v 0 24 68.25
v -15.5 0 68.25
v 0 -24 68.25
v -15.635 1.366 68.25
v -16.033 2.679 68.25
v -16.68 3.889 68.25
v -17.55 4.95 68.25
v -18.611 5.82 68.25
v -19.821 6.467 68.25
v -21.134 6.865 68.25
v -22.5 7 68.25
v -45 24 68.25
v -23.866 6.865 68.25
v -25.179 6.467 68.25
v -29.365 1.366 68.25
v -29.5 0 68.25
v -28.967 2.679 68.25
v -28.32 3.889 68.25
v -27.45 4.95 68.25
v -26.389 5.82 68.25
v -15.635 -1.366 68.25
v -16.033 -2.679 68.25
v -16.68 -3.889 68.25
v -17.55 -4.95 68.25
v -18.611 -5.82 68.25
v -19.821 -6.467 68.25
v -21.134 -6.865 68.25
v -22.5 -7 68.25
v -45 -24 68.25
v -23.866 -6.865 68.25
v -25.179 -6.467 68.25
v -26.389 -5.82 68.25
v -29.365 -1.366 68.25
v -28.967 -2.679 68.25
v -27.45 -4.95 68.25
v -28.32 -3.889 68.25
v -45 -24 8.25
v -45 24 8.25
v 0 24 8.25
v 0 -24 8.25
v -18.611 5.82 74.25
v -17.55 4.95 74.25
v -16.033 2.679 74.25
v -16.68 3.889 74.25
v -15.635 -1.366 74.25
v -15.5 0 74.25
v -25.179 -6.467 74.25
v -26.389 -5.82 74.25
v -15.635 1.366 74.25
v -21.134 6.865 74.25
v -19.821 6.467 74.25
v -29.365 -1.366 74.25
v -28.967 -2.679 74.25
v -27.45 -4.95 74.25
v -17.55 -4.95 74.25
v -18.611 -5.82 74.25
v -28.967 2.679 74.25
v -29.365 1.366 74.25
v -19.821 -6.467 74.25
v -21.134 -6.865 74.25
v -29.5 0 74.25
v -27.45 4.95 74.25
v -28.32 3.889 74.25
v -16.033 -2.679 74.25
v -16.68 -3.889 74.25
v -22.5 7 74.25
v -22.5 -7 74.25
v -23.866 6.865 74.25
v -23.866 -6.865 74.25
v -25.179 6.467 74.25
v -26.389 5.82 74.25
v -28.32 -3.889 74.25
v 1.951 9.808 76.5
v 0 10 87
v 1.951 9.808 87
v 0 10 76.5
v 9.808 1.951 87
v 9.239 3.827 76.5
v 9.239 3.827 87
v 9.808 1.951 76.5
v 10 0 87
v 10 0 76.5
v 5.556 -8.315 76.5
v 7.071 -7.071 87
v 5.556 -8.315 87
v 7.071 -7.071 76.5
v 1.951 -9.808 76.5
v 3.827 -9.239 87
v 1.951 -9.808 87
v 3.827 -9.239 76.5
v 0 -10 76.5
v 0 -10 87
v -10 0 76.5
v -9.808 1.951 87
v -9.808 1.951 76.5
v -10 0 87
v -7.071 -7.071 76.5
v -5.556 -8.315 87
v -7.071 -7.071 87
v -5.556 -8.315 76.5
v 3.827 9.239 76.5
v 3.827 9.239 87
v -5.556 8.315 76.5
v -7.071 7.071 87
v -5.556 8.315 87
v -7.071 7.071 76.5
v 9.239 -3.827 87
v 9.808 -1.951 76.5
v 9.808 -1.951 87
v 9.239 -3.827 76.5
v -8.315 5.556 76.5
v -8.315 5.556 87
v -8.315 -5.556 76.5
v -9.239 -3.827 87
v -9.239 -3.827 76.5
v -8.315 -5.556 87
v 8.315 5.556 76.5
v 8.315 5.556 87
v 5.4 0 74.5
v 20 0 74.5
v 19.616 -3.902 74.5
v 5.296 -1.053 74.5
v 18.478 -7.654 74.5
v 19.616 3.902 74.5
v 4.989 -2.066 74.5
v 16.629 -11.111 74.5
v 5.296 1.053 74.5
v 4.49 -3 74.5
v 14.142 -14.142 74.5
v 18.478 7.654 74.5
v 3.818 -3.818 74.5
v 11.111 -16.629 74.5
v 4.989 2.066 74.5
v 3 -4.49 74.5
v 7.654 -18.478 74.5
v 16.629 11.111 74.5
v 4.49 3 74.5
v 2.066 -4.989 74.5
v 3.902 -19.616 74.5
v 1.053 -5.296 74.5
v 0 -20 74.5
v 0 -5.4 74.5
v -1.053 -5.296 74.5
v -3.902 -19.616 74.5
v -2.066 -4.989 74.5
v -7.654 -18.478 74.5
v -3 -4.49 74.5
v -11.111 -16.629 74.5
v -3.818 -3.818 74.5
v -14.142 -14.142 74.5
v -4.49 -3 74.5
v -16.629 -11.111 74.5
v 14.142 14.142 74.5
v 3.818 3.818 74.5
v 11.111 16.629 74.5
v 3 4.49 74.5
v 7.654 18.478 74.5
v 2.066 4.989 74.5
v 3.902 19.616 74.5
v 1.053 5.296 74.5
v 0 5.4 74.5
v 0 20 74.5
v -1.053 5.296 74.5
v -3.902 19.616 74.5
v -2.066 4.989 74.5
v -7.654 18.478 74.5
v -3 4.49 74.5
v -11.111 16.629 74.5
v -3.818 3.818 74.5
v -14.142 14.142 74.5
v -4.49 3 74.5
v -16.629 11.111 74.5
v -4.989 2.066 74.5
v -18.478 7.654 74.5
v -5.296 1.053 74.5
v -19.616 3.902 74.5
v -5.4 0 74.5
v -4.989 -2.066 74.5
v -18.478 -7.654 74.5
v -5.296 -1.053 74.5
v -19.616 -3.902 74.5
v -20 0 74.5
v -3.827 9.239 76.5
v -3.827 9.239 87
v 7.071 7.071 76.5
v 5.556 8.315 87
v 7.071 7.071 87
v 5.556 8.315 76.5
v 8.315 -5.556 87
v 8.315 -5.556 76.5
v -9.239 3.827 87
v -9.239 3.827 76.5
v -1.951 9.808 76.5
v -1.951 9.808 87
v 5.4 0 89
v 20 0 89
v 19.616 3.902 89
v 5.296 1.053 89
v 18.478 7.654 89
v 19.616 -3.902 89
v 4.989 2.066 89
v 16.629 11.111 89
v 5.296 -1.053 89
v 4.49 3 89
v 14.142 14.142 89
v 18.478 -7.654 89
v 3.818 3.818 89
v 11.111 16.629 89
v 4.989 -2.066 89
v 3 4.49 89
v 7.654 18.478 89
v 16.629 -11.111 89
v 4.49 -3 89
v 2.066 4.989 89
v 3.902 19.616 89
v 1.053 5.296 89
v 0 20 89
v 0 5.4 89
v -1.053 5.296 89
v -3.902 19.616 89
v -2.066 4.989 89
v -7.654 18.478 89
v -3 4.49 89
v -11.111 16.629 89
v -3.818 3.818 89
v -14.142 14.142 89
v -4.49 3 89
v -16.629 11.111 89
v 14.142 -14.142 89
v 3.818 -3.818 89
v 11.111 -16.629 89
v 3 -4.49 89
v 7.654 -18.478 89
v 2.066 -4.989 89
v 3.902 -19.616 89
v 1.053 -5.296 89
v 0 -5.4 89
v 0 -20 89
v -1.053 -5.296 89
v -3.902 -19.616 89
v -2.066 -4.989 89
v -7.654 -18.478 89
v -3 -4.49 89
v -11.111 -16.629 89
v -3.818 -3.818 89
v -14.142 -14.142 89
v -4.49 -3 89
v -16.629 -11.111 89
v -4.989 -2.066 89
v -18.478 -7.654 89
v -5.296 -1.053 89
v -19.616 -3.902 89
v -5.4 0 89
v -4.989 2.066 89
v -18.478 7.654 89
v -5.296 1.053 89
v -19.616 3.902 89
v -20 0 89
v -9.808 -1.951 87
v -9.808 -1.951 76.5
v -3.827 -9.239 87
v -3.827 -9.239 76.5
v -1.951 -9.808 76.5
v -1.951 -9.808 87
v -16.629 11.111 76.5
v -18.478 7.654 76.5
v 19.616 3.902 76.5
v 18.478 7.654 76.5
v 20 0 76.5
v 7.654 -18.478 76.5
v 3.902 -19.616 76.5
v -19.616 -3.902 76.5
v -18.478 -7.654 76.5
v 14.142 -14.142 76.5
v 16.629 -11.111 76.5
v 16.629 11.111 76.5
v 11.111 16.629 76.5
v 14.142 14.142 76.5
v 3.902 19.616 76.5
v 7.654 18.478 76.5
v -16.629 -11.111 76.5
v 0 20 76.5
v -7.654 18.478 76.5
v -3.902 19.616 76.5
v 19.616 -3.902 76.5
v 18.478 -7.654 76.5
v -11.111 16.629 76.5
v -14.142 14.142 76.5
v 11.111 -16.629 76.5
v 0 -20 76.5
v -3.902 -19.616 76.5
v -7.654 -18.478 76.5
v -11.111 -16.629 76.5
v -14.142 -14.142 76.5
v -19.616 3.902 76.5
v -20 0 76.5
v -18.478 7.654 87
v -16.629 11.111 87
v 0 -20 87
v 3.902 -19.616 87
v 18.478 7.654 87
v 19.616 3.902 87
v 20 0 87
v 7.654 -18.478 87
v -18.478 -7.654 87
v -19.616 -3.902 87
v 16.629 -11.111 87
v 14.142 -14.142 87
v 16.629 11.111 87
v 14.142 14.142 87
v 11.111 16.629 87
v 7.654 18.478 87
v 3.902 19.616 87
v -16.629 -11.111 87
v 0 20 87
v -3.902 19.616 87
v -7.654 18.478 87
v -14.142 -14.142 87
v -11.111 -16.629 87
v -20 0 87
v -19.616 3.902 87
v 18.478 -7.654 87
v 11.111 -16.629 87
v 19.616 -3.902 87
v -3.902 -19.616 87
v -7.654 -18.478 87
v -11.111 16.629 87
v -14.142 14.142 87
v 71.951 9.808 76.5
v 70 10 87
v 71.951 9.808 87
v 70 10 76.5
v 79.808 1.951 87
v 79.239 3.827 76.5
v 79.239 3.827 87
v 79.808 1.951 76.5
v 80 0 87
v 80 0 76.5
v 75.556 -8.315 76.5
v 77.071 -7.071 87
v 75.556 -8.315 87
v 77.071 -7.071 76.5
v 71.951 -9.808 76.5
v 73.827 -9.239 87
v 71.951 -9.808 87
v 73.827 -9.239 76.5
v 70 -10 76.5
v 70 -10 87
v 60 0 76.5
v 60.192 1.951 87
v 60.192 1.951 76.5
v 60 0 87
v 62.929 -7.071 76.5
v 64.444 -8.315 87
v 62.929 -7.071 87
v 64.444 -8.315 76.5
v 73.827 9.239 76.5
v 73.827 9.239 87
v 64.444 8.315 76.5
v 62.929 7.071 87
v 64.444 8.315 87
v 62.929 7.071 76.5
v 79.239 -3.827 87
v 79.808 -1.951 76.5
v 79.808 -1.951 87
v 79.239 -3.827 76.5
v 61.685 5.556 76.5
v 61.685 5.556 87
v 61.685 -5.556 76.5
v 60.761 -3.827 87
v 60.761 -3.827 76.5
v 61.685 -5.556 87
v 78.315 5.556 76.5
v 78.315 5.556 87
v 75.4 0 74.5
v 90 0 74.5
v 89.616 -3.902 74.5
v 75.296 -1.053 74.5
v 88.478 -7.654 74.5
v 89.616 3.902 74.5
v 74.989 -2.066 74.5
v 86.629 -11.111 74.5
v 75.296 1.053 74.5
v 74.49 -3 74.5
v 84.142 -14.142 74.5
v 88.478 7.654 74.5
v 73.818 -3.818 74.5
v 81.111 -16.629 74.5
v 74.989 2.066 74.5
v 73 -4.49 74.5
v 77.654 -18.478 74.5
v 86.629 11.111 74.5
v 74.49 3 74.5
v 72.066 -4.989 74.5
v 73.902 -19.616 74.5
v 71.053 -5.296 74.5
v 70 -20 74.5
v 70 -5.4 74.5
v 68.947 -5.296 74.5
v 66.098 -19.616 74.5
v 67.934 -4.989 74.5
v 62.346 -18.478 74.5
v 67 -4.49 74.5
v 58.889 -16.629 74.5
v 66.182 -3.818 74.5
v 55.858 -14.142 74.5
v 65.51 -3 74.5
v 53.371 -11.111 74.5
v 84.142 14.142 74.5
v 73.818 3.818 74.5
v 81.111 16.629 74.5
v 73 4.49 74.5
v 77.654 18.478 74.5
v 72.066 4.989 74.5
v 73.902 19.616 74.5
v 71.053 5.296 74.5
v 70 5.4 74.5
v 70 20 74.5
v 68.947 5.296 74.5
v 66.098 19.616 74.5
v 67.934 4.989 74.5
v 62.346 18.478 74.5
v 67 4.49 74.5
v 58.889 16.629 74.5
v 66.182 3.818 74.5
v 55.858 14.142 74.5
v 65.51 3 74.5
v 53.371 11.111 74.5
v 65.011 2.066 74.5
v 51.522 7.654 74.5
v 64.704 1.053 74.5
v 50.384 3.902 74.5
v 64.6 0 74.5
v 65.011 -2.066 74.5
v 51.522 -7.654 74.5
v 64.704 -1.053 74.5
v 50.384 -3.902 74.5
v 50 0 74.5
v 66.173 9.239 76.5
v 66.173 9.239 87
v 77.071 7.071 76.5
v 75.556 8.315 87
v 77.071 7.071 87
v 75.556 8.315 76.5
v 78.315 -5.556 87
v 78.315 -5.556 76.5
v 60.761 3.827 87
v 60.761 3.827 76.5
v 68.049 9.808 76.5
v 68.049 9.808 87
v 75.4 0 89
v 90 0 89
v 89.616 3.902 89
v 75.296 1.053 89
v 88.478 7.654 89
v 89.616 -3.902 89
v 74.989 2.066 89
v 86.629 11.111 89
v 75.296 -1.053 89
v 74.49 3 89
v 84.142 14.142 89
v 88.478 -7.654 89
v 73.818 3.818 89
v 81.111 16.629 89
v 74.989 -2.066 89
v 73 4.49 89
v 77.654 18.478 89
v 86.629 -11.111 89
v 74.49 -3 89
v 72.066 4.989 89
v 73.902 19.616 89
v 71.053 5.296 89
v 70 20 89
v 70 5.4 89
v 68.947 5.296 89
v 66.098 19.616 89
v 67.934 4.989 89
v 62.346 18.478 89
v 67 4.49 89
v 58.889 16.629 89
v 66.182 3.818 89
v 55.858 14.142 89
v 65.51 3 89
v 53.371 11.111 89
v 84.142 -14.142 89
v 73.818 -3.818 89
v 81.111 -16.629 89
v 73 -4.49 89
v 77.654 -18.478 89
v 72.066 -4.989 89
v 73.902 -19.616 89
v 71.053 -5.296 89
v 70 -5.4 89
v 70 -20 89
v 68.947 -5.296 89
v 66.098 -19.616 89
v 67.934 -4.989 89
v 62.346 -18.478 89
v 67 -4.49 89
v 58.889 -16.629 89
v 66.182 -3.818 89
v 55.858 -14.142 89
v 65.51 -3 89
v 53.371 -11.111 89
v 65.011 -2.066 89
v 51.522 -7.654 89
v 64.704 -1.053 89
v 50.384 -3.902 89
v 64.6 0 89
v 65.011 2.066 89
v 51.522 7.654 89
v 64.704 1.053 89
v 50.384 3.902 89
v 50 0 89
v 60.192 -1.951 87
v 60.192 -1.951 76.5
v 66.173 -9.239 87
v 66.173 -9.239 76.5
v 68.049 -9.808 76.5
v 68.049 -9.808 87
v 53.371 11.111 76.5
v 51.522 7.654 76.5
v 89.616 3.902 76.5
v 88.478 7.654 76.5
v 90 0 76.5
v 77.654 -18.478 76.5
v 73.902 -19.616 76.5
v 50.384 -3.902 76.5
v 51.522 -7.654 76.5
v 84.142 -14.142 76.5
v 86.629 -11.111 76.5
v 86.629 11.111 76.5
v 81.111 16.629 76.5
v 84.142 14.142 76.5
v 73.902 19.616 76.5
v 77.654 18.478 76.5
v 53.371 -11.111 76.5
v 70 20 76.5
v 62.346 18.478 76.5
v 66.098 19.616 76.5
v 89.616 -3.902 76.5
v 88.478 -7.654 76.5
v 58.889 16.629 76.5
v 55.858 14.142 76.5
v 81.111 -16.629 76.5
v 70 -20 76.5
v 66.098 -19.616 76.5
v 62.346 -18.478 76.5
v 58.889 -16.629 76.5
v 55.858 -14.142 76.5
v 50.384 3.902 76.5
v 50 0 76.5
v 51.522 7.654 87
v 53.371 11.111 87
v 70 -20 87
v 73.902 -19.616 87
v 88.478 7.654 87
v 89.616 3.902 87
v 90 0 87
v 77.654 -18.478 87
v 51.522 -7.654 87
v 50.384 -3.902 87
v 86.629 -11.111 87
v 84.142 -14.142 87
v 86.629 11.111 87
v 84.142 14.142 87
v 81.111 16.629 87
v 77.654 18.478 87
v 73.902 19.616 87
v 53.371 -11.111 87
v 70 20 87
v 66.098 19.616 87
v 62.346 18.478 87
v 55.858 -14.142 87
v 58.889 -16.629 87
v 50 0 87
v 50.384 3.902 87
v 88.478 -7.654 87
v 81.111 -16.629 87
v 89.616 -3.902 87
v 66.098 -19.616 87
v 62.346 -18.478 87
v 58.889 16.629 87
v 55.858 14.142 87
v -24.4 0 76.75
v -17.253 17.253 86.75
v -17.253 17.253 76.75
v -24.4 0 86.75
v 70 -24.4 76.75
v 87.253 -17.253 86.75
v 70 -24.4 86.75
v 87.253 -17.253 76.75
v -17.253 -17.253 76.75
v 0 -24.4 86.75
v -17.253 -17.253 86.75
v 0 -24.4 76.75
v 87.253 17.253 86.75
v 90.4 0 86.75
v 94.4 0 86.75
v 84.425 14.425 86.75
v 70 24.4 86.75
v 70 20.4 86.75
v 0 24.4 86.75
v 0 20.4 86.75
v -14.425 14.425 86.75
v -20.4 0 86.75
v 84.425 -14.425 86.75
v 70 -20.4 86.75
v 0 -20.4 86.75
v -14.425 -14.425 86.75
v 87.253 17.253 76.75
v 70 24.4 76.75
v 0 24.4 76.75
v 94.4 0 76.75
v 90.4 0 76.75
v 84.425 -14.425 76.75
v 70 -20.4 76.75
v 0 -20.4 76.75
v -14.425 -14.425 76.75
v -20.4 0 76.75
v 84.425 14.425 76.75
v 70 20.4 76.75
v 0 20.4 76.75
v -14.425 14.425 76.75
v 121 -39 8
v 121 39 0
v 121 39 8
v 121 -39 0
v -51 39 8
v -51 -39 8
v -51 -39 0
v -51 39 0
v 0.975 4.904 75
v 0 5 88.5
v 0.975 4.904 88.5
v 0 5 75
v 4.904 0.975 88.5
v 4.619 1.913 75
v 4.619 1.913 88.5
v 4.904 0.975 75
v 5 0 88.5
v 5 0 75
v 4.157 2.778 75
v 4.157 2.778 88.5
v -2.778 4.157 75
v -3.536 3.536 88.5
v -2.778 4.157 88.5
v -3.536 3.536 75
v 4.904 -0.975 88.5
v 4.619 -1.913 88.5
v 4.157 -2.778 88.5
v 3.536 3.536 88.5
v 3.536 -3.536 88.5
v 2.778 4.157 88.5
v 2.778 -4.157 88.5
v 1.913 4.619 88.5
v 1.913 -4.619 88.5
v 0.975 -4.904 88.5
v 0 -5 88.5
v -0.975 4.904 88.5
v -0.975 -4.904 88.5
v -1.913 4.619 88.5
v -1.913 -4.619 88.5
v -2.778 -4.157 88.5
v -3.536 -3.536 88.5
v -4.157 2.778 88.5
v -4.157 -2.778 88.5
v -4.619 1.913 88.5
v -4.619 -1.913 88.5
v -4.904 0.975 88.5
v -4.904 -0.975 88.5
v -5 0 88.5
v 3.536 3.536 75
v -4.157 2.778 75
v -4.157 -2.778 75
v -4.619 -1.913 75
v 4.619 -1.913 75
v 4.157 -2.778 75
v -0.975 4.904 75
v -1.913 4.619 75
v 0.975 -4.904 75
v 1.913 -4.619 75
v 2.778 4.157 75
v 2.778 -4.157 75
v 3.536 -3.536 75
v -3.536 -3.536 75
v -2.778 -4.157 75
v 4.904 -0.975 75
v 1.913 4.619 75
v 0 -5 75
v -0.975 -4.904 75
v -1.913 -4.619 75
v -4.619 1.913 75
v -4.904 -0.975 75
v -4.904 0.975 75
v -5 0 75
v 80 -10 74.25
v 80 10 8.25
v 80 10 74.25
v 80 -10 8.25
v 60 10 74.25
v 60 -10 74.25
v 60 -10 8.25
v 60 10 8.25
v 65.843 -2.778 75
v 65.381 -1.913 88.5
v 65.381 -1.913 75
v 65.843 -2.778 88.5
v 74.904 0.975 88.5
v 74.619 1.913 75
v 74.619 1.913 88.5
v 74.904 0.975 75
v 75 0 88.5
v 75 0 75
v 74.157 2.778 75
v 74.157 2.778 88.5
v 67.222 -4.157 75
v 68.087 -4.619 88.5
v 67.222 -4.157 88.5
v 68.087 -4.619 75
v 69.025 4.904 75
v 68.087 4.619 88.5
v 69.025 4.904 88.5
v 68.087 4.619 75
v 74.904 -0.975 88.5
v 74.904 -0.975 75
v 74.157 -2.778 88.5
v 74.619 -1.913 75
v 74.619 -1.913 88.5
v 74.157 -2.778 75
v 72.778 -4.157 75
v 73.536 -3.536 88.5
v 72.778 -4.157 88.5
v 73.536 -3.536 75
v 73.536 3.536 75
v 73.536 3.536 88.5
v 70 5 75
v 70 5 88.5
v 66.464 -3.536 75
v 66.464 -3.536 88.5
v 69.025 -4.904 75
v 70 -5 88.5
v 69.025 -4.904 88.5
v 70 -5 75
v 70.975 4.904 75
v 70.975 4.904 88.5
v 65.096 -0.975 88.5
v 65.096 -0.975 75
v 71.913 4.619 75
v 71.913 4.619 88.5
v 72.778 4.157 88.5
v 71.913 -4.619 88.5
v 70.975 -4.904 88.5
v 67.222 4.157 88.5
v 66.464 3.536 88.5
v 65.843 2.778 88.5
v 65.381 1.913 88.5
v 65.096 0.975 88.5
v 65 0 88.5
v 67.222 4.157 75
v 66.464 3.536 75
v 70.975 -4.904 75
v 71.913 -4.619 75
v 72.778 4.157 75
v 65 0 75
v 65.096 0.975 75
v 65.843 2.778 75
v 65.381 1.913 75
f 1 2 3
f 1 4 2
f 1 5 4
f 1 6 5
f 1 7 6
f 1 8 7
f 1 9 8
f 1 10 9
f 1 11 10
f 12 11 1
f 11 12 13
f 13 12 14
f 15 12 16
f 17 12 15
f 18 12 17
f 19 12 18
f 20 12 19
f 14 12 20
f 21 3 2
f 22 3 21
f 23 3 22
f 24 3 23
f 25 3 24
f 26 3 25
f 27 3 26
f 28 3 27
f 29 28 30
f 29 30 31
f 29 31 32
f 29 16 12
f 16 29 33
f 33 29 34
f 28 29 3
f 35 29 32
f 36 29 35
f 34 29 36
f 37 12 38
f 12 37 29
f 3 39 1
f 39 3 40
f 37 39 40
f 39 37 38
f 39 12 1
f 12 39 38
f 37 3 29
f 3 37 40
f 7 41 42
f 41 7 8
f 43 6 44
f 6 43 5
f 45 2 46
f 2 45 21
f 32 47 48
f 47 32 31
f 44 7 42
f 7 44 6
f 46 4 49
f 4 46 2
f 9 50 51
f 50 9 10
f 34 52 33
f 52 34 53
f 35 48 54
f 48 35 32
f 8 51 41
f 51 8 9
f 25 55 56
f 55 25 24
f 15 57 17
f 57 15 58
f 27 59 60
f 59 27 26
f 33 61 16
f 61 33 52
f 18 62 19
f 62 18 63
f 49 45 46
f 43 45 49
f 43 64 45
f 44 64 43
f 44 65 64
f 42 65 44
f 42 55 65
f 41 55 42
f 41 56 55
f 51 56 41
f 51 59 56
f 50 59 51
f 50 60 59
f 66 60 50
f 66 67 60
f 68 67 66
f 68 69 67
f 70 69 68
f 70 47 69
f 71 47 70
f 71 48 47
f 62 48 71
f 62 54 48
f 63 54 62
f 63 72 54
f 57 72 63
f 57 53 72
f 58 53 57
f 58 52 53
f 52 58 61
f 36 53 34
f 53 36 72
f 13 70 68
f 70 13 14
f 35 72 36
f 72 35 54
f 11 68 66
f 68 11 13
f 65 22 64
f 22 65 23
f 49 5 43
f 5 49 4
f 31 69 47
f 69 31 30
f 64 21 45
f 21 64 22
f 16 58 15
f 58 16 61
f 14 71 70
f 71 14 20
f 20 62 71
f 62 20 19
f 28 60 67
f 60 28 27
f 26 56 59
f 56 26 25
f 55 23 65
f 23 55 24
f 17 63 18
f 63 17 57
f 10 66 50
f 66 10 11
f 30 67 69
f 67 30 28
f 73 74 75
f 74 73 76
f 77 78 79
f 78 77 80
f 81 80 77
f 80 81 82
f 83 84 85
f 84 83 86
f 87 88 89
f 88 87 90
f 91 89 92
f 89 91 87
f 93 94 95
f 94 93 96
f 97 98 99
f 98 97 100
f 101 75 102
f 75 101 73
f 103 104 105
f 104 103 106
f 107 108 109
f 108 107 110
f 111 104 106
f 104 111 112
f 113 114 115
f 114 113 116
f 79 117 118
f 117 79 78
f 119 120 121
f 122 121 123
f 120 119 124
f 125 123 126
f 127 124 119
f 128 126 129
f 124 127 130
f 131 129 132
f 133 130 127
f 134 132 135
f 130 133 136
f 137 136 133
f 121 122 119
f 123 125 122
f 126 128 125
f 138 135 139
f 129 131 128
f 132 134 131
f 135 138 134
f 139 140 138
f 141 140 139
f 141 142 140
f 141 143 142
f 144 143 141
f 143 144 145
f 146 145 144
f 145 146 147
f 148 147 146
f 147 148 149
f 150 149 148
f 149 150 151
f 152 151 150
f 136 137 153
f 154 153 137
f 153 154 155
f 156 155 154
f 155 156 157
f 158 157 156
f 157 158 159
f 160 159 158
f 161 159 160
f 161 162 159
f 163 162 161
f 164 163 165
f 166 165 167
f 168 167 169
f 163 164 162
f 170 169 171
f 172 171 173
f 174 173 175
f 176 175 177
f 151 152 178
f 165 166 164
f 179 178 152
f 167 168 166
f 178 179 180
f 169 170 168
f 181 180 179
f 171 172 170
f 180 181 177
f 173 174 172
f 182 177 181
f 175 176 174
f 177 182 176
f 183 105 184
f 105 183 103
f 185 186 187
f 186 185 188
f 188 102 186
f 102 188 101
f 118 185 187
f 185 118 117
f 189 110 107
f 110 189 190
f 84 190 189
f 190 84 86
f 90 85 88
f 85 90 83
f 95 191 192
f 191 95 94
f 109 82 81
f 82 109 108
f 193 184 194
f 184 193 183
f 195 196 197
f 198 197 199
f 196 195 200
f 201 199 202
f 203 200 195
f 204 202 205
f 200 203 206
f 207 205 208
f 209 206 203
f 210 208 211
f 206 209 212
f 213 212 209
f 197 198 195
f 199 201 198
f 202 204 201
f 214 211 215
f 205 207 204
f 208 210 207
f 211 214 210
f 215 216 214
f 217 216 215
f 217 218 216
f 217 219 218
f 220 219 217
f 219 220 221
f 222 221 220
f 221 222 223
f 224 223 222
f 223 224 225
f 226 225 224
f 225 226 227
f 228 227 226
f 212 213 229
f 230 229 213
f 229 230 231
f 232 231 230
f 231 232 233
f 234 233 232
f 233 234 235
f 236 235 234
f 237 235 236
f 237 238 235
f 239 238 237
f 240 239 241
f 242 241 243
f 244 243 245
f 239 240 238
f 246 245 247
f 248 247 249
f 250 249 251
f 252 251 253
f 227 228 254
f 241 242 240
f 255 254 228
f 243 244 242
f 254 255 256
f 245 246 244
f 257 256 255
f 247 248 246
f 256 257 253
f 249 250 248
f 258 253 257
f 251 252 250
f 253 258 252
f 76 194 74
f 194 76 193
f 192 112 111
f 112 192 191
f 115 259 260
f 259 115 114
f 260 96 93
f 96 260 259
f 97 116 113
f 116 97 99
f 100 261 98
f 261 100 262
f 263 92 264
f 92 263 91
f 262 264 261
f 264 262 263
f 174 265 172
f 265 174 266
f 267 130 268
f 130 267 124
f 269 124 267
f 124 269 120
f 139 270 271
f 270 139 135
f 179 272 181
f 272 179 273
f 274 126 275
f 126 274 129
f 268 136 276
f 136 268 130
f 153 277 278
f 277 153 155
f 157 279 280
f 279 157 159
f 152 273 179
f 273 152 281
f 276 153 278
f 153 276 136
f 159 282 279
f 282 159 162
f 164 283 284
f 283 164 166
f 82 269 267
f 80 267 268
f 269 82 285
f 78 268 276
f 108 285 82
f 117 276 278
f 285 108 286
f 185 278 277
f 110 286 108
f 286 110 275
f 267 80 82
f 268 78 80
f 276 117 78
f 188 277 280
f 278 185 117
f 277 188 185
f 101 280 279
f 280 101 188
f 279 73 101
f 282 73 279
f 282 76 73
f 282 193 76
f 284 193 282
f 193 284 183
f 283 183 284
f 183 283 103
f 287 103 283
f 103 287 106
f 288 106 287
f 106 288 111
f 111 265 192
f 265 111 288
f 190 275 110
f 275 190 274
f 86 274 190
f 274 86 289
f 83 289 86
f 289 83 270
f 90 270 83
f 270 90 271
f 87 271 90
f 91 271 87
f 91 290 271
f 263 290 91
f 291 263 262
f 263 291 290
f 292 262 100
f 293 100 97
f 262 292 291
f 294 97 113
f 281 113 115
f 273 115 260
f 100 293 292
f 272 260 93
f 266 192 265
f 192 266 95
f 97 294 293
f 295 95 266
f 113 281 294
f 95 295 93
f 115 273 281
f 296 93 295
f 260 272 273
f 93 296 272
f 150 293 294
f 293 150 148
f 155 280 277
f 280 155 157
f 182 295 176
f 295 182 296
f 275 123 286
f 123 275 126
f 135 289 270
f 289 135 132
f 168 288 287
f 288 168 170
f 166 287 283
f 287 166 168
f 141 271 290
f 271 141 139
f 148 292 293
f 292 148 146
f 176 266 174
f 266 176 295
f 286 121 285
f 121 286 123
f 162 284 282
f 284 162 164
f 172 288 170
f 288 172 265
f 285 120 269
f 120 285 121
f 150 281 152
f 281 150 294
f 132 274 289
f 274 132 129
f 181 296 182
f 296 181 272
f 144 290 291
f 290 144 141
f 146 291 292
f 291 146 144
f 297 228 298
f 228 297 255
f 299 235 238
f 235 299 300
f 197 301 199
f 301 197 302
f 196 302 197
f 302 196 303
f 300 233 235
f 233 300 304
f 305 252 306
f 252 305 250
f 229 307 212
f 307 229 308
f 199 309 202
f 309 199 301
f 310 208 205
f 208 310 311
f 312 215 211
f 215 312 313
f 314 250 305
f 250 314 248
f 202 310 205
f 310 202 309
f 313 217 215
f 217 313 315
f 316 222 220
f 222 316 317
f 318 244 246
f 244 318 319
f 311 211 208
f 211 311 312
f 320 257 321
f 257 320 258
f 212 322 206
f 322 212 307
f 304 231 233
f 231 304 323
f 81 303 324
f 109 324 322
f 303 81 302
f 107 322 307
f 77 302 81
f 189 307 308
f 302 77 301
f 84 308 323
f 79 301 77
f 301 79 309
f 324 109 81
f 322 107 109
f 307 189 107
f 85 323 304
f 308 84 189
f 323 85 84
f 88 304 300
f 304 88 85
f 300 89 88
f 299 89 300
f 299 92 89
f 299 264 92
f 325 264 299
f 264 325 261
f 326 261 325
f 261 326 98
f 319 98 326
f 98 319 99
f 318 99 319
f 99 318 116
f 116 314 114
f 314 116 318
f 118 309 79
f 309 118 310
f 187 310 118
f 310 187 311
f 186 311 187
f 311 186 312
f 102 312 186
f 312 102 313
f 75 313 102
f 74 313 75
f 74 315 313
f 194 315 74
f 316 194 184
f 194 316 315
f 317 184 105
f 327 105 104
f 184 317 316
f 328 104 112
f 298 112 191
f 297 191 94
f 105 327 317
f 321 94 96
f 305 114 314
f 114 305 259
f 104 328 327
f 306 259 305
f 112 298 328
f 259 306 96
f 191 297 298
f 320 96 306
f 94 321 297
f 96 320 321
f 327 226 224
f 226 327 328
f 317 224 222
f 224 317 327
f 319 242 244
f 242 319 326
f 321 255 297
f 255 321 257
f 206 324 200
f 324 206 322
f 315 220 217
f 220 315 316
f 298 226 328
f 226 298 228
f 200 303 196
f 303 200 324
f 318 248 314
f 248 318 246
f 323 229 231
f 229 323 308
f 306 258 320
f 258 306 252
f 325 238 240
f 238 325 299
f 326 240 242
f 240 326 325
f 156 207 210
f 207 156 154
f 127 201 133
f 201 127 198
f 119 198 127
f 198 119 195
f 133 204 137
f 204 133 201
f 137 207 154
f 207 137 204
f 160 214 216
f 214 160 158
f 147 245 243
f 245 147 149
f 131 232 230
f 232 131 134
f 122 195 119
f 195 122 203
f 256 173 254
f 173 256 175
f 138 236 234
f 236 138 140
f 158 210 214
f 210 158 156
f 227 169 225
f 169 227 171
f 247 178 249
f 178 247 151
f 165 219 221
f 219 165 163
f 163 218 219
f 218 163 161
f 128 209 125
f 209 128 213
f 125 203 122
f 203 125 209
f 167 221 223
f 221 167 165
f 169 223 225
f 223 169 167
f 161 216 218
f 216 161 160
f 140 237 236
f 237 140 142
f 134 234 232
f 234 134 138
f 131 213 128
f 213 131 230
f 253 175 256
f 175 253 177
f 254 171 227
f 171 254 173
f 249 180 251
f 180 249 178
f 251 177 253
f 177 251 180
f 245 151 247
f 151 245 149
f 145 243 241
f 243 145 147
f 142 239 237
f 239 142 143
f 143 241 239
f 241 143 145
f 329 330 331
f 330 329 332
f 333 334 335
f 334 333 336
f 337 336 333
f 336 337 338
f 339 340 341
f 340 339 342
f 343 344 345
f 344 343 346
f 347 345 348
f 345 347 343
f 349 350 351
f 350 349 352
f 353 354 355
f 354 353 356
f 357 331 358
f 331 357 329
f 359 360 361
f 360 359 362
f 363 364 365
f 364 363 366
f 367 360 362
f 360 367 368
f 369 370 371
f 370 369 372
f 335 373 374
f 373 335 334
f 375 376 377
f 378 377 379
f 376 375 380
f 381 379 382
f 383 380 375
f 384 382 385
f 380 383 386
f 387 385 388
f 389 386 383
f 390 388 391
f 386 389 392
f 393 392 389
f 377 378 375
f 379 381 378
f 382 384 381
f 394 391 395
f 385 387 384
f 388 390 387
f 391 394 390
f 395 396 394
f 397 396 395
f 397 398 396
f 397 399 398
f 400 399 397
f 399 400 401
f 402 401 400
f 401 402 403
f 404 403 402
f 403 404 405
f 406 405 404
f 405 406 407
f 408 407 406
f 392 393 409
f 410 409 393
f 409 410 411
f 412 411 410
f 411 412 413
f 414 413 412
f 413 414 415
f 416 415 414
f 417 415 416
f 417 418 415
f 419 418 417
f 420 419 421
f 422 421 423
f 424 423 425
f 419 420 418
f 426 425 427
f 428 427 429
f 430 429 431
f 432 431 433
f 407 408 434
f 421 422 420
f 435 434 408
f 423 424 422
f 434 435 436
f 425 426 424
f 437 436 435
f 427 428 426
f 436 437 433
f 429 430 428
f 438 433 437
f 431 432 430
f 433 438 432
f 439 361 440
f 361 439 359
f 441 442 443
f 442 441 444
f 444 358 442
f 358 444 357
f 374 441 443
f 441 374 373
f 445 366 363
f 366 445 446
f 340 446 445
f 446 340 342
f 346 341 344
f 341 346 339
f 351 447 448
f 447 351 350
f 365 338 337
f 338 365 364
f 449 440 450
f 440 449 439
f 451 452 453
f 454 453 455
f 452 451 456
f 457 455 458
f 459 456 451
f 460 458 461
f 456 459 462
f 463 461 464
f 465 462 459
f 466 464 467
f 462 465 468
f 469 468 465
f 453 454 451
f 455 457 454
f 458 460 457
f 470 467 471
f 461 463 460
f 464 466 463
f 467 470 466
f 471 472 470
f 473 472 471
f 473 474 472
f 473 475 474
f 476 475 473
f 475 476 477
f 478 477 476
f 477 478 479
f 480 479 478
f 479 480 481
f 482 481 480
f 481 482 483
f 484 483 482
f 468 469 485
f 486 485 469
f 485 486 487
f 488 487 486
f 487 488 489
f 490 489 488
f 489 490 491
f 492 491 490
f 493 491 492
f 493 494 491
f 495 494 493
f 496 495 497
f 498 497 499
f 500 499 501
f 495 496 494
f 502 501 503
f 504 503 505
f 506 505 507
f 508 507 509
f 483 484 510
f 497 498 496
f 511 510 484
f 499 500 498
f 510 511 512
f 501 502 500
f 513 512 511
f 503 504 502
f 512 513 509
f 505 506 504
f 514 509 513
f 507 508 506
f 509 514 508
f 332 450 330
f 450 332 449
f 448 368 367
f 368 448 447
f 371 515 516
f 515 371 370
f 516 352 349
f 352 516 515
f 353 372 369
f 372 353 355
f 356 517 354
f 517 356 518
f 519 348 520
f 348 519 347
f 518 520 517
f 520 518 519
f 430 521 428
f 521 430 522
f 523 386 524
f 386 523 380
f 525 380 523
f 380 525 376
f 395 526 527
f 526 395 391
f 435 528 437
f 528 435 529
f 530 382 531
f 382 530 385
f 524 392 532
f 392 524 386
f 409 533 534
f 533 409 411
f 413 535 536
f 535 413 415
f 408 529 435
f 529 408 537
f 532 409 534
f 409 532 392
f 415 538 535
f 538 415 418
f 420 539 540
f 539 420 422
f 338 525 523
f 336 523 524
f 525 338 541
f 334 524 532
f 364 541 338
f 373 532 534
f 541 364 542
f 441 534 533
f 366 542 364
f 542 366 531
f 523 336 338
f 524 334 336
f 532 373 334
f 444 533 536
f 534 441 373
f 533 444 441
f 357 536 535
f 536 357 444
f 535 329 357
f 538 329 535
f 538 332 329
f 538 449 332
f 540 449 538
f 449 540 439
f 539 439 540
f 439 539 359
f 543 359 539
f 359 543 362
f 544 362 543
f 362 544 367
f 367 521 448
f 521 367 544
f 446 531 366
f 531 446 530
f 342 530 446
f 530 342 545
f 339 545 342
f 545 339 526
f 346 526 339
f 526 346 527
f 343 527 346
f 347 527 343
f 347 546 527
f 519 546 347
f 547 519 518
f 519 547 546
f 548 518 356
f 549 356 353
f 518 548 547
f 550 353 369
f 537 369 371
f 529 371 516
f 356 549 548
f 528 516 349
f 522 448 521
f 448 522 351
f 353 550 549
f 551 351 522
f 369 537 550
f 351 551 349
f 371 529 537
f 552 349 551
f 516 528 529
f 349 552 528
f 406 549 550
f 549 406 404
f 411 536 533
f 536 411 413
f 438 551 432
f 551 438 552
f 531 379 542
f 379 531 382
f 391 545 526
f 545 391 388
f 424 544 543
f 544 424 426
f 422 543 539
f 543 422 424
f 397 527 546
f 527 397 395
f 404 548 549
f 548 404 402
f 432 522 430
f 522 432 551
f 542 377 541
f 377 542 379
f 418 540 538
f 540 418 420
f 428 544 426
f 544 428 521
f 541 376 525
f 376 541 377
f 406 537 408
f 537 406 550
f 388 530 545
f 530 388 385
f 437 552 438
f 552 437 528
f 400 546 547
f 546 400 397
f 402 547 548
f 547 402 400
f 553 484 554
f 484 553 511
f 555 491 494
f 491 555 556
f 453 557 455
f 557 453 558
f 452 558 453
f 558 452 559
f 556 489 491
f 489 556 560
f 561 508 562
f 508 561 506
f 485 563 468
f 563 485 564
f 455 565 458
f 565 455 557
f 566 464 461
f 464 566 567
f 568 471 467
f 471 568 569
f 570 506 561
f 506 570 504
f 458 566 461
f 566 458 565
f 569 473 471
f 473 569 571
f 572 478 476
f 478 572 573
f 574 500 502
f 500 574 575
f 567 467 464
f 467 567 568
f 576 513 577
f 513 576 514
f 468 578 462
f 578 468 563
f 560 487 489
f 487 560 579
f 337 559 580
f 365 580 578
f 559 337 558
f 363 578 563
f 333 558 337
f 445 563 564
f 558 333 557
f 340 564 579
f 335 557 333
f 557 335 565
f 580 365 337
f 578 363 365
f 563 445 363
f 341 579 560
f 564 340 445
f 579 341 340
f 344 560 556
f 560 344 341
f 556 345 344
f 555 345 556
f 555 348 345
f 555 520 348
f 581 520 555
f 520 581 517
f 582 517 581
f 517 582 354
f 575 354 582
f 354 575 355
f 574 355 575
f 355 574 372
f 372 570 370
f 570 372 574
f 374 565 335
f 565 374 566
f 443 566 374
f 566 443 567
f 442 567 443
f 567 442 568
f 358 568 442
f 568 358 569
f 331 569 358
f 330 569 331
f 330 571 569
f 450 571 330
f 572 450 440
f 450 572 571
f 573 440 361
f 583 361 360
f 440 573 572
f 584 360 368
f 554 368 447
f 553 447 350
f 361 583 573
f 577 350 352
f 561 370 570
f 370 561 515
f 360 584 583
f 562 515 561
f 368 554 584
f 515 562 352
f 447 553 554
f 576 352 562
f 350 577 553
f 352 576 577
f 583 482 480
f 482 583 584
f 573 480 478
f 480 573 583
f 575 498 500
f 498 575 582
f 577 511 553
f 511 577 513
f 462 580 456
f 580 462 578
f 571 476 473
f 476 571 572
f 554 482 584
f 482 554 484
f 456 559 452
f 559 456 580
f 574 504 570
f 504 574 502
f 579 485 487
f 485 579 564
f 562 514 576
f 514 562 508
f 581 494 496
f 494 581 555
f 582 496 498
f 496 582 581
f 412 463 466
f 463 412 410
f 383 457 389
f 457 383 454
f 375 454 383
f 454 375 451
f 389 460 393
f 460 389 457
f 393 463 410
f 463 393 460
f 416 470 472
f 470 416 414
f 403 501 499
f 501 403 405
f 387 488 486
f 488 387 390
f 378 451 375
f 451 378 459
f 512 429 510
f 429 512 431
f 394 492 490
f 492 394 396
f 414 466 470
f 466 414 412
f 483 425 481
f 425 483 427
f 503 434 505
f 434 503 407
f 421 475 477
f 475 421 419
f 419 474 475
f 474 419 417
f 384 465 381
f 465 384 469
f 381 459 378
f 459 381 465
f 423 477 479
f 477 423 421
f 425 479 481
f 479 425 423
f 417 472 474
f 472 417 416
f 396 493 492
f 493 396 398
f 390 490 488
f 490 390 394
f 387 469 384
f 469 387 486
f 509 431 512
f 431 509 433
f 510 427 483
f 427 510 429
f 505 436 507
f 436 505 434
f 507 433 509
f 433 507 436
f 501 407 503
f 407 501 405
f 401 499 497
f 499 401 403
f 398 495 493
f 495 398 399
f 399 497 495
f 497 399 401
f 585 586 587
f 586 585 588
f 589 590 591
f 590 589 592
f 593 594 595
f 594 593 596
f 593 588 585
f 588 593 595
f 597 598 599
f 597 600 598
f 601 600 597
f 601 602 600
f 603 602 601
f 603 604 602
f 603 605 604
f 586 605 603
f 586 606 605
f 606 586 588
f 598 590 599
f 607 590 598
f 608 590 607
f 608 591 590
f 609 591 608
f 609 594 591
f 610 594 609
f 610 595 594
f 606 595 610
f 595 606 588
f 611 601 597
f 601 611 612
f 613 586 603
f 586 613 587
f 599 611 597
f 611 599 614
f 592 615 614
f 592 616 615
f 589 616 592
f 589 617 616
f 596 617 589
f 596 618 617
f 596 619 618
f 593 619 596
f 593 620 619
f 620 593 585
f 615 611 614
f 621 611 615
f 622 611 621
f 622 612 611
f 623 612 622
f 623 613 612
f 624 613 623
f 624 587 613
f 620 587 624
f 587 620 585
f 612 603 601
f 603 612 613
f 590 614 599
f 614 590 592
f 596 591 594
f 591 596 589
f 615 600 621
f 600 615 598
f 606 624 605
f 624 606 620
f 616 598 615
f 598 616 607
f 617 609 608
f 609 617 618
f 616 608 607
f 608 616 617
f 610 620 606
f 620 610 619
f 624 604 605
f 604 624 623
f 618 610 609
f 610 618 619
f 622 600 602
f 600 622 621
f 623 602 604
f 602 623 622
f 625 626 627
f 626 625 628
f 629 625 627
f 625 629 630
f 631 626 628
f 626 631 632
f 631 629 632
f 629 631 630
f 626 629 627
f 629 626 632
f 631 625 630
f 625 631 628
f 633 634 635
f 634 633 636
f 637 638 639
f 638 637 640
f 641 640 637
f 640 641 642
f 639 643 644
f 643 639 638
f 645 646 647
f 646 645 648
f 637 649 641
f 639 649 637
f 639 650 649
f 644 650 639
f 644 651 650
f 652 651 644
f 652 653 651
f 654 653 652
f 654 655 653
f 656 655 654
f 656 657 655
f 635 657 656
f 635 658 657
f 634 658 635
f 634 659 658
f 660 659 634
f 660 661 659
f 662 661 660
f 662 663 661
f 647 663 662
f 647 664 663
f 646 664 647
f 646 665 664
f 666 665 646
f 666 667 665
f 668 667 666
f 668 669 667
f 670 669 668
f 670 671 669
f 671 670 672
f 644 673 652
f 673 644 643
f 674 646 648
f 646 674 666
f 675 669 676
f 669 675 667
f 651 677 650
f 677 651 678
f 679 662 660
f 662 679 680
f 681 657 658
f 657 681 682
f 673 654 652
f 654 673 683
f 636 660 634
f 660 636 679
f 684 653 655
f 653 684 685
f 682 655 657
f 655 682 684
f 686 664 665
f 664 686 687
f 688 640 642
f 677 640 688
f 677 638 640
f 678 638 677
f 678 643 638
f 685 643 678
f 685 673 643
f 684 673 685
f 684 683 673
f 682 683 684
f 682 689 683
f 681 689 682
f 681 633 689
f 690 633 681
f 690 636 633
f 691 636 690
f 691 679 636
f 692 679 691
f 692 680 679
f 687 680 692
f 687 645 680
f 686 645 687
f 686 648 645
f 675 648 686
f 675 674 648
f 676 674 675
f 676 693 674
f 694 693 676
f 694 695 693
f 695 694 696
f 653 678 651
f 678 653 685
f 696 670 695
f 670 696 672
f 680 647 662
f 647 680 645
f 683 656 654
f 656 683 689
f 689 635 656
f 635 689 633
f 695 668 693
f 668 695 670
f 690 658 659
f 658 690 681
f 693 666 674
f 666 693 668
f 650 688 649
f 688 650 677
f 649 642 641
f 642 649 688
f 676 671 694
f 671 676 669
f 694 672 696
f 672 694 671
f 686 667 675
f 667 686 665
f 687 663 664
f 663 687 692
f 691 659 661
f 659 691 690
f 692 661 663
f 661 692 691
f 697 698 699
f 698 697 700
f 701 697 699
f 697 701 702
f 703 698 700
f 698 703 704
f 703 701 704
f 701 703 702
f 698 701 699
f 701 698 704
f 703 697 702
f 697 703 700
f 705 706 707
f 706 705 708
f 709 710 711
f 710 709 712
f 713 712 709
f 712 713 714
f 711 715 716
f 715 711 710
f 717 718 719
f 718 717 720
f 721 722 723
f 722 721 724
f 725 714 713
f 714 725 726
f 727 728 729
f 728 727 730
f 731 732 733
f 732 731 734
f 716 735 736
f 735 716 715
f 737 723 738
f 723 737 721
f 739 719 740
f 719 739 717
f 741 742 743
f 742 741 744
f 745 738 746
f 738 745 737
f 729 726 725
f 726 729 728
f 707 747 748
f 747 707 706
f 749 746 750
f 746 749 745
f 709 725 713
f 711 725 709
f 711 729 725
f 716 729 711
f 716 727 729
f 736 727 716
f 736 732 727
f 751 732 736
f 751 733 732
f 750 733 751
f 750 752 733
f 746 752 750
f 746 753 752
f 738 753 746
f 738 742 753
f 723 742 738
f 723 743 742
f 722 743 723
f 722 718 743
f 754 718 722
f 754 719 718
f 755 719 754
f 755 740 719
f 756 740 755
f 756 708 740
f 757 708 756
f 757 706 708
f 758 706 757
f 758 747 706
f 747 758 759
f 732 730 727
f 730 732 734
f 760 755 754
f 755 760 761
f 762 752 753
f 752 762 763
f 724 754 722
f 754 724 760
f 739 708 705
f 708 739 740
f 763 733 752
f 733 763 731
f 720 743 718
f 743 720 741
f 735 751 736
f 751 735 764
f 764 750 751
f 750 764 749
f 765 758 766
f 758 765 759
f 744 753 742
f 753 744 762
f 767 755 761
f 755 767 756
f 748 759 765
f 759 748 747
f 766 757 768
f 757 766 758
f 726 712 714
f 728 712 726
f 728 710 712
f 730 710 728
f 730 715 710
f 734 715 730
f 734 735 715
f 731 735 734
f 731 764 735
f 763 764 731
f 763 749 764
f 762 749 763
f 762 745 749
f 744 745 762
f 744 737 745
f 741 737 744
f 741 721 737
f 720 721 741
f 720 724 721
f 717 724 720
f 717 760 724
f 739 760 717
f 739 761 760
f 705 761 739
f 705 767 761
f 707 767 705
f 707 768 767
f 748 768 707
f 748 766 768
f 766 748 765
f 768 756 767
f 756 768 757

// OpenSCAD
$fn = 32;

// ------------------------------------------------------------------------
// Motor belt drive: span 70 mm, pulleys d40, belt 10 mm wide
// Every part is its own module, assembly() places every instance.
// ------------------------------------------------------------------------

// --- part 1 ---
module base_plate() {
  difference() {
    translate([-86, -39, 0]) cube([172, 78, 8]);
  }
}

// --- part 2 ---
module motor() {
  union() {
    translate([-30, -24, 0]) cube([60, 48, 45]);
    translate([33, 0, 22.5]) rotate([0, 90, 0]) cylinder(h = 6, d = 14, center = true);
  }
}

// --- part 3 ---
module drive_shaft() {
  translate([0, 0, -6.75]) cylinder(h = 13.5, d = 10);
}

// --- part 4 ---
module pulley_drive() {
  difference() {
    union() {
      cylinder(h = 14.5, d = 20);
      cylinder(h = 2, d = 40);
      translate([0, 0, 12.5]) cylinder(h = 2, d = 40);
    }
    translate([0, 0, -1]) cylinder(h = 16.5, d = 10.8);
  }
}

// --- part 5 ---
module idler_post() {
  translate([-10, -10, 0]) cube([20, 20, 66]);
}

// --- part 6 ---
module driven_shaft() {
  translate([0, 0, -6.75]) cylinder(h = 13.5, d = 10);
}

// --- part 7 ---
module pulley_driven() {
  difference() {
    union() {
      cylinder(h = 14.5, d = 20);
      cylinder(h = 2, d = 40);
      translate([0, 0, 12.5]) cylinder(h = 2, d = 40);
    }
    translate([0, 0, -1]) cylinder(h = 16.5, d = 10.8);
  }
}

// --- part 8 ---
module drive_belt() {
  difference() {
    linear_extrude(height = 10) polygon(points = concat([for (a = [90 : 45 : 270]) [24.4 * cos(a), 24.4 * sin(a)]], [for (a = [270 : 45 : 450]) [70 + 24.4 * cos(a), 24.4 * sin(a)]]));
    translate([0, 0, -1]) linear_extrude(height = 12) polygon(points = concat([for (a = [90 : 45 : 270]) [20.4 * cos(a), 20.4 * sin(a)]], [for (a = [270 : 45 : 450]) [70 + 20.4 * cos(a), 20.4 * sin(a)]]));
  }
}

// --- assembly ---
module assembly() {
  color([0.80, 0.24, 0.20]) translate([35, 0, 0]) rotate([0, 0, 0]) base_plate();
  color([0.20, 0.45, 0.75]) translate([0, 0, 38.25]) rotate([0, 270, 0]) motor();
  color([0.25, 0.62, 0.32]) translate([0, 0, 81.75]) rotate([0, 0, 0]) drive_shaft();
  color([0.92, 0.70, 0.18]) translate([0, 0, 74.5]) rotate([0, 0, 0]) pulley_drive();
  color([0.58, 0.35, 0.70]) translate([70, 0, 8.25]) rotate([0, 0, 0]) idler_post();
  color([0.16, 0.66, 0.66]) translate([70, 0, 81.75]) rotate([0, 0, 0]) driven_shaft();
  color([0.85, 0.48, 0.18]) translate([70, 0, 74.5]) rotate([0, 0, 0]) pulley_driven();
  color([0.55, 0.60, 0.65]) translate([0, 0, 76.75]) rotate([0, 0, 0]) drive_belt();
}

assembly();
